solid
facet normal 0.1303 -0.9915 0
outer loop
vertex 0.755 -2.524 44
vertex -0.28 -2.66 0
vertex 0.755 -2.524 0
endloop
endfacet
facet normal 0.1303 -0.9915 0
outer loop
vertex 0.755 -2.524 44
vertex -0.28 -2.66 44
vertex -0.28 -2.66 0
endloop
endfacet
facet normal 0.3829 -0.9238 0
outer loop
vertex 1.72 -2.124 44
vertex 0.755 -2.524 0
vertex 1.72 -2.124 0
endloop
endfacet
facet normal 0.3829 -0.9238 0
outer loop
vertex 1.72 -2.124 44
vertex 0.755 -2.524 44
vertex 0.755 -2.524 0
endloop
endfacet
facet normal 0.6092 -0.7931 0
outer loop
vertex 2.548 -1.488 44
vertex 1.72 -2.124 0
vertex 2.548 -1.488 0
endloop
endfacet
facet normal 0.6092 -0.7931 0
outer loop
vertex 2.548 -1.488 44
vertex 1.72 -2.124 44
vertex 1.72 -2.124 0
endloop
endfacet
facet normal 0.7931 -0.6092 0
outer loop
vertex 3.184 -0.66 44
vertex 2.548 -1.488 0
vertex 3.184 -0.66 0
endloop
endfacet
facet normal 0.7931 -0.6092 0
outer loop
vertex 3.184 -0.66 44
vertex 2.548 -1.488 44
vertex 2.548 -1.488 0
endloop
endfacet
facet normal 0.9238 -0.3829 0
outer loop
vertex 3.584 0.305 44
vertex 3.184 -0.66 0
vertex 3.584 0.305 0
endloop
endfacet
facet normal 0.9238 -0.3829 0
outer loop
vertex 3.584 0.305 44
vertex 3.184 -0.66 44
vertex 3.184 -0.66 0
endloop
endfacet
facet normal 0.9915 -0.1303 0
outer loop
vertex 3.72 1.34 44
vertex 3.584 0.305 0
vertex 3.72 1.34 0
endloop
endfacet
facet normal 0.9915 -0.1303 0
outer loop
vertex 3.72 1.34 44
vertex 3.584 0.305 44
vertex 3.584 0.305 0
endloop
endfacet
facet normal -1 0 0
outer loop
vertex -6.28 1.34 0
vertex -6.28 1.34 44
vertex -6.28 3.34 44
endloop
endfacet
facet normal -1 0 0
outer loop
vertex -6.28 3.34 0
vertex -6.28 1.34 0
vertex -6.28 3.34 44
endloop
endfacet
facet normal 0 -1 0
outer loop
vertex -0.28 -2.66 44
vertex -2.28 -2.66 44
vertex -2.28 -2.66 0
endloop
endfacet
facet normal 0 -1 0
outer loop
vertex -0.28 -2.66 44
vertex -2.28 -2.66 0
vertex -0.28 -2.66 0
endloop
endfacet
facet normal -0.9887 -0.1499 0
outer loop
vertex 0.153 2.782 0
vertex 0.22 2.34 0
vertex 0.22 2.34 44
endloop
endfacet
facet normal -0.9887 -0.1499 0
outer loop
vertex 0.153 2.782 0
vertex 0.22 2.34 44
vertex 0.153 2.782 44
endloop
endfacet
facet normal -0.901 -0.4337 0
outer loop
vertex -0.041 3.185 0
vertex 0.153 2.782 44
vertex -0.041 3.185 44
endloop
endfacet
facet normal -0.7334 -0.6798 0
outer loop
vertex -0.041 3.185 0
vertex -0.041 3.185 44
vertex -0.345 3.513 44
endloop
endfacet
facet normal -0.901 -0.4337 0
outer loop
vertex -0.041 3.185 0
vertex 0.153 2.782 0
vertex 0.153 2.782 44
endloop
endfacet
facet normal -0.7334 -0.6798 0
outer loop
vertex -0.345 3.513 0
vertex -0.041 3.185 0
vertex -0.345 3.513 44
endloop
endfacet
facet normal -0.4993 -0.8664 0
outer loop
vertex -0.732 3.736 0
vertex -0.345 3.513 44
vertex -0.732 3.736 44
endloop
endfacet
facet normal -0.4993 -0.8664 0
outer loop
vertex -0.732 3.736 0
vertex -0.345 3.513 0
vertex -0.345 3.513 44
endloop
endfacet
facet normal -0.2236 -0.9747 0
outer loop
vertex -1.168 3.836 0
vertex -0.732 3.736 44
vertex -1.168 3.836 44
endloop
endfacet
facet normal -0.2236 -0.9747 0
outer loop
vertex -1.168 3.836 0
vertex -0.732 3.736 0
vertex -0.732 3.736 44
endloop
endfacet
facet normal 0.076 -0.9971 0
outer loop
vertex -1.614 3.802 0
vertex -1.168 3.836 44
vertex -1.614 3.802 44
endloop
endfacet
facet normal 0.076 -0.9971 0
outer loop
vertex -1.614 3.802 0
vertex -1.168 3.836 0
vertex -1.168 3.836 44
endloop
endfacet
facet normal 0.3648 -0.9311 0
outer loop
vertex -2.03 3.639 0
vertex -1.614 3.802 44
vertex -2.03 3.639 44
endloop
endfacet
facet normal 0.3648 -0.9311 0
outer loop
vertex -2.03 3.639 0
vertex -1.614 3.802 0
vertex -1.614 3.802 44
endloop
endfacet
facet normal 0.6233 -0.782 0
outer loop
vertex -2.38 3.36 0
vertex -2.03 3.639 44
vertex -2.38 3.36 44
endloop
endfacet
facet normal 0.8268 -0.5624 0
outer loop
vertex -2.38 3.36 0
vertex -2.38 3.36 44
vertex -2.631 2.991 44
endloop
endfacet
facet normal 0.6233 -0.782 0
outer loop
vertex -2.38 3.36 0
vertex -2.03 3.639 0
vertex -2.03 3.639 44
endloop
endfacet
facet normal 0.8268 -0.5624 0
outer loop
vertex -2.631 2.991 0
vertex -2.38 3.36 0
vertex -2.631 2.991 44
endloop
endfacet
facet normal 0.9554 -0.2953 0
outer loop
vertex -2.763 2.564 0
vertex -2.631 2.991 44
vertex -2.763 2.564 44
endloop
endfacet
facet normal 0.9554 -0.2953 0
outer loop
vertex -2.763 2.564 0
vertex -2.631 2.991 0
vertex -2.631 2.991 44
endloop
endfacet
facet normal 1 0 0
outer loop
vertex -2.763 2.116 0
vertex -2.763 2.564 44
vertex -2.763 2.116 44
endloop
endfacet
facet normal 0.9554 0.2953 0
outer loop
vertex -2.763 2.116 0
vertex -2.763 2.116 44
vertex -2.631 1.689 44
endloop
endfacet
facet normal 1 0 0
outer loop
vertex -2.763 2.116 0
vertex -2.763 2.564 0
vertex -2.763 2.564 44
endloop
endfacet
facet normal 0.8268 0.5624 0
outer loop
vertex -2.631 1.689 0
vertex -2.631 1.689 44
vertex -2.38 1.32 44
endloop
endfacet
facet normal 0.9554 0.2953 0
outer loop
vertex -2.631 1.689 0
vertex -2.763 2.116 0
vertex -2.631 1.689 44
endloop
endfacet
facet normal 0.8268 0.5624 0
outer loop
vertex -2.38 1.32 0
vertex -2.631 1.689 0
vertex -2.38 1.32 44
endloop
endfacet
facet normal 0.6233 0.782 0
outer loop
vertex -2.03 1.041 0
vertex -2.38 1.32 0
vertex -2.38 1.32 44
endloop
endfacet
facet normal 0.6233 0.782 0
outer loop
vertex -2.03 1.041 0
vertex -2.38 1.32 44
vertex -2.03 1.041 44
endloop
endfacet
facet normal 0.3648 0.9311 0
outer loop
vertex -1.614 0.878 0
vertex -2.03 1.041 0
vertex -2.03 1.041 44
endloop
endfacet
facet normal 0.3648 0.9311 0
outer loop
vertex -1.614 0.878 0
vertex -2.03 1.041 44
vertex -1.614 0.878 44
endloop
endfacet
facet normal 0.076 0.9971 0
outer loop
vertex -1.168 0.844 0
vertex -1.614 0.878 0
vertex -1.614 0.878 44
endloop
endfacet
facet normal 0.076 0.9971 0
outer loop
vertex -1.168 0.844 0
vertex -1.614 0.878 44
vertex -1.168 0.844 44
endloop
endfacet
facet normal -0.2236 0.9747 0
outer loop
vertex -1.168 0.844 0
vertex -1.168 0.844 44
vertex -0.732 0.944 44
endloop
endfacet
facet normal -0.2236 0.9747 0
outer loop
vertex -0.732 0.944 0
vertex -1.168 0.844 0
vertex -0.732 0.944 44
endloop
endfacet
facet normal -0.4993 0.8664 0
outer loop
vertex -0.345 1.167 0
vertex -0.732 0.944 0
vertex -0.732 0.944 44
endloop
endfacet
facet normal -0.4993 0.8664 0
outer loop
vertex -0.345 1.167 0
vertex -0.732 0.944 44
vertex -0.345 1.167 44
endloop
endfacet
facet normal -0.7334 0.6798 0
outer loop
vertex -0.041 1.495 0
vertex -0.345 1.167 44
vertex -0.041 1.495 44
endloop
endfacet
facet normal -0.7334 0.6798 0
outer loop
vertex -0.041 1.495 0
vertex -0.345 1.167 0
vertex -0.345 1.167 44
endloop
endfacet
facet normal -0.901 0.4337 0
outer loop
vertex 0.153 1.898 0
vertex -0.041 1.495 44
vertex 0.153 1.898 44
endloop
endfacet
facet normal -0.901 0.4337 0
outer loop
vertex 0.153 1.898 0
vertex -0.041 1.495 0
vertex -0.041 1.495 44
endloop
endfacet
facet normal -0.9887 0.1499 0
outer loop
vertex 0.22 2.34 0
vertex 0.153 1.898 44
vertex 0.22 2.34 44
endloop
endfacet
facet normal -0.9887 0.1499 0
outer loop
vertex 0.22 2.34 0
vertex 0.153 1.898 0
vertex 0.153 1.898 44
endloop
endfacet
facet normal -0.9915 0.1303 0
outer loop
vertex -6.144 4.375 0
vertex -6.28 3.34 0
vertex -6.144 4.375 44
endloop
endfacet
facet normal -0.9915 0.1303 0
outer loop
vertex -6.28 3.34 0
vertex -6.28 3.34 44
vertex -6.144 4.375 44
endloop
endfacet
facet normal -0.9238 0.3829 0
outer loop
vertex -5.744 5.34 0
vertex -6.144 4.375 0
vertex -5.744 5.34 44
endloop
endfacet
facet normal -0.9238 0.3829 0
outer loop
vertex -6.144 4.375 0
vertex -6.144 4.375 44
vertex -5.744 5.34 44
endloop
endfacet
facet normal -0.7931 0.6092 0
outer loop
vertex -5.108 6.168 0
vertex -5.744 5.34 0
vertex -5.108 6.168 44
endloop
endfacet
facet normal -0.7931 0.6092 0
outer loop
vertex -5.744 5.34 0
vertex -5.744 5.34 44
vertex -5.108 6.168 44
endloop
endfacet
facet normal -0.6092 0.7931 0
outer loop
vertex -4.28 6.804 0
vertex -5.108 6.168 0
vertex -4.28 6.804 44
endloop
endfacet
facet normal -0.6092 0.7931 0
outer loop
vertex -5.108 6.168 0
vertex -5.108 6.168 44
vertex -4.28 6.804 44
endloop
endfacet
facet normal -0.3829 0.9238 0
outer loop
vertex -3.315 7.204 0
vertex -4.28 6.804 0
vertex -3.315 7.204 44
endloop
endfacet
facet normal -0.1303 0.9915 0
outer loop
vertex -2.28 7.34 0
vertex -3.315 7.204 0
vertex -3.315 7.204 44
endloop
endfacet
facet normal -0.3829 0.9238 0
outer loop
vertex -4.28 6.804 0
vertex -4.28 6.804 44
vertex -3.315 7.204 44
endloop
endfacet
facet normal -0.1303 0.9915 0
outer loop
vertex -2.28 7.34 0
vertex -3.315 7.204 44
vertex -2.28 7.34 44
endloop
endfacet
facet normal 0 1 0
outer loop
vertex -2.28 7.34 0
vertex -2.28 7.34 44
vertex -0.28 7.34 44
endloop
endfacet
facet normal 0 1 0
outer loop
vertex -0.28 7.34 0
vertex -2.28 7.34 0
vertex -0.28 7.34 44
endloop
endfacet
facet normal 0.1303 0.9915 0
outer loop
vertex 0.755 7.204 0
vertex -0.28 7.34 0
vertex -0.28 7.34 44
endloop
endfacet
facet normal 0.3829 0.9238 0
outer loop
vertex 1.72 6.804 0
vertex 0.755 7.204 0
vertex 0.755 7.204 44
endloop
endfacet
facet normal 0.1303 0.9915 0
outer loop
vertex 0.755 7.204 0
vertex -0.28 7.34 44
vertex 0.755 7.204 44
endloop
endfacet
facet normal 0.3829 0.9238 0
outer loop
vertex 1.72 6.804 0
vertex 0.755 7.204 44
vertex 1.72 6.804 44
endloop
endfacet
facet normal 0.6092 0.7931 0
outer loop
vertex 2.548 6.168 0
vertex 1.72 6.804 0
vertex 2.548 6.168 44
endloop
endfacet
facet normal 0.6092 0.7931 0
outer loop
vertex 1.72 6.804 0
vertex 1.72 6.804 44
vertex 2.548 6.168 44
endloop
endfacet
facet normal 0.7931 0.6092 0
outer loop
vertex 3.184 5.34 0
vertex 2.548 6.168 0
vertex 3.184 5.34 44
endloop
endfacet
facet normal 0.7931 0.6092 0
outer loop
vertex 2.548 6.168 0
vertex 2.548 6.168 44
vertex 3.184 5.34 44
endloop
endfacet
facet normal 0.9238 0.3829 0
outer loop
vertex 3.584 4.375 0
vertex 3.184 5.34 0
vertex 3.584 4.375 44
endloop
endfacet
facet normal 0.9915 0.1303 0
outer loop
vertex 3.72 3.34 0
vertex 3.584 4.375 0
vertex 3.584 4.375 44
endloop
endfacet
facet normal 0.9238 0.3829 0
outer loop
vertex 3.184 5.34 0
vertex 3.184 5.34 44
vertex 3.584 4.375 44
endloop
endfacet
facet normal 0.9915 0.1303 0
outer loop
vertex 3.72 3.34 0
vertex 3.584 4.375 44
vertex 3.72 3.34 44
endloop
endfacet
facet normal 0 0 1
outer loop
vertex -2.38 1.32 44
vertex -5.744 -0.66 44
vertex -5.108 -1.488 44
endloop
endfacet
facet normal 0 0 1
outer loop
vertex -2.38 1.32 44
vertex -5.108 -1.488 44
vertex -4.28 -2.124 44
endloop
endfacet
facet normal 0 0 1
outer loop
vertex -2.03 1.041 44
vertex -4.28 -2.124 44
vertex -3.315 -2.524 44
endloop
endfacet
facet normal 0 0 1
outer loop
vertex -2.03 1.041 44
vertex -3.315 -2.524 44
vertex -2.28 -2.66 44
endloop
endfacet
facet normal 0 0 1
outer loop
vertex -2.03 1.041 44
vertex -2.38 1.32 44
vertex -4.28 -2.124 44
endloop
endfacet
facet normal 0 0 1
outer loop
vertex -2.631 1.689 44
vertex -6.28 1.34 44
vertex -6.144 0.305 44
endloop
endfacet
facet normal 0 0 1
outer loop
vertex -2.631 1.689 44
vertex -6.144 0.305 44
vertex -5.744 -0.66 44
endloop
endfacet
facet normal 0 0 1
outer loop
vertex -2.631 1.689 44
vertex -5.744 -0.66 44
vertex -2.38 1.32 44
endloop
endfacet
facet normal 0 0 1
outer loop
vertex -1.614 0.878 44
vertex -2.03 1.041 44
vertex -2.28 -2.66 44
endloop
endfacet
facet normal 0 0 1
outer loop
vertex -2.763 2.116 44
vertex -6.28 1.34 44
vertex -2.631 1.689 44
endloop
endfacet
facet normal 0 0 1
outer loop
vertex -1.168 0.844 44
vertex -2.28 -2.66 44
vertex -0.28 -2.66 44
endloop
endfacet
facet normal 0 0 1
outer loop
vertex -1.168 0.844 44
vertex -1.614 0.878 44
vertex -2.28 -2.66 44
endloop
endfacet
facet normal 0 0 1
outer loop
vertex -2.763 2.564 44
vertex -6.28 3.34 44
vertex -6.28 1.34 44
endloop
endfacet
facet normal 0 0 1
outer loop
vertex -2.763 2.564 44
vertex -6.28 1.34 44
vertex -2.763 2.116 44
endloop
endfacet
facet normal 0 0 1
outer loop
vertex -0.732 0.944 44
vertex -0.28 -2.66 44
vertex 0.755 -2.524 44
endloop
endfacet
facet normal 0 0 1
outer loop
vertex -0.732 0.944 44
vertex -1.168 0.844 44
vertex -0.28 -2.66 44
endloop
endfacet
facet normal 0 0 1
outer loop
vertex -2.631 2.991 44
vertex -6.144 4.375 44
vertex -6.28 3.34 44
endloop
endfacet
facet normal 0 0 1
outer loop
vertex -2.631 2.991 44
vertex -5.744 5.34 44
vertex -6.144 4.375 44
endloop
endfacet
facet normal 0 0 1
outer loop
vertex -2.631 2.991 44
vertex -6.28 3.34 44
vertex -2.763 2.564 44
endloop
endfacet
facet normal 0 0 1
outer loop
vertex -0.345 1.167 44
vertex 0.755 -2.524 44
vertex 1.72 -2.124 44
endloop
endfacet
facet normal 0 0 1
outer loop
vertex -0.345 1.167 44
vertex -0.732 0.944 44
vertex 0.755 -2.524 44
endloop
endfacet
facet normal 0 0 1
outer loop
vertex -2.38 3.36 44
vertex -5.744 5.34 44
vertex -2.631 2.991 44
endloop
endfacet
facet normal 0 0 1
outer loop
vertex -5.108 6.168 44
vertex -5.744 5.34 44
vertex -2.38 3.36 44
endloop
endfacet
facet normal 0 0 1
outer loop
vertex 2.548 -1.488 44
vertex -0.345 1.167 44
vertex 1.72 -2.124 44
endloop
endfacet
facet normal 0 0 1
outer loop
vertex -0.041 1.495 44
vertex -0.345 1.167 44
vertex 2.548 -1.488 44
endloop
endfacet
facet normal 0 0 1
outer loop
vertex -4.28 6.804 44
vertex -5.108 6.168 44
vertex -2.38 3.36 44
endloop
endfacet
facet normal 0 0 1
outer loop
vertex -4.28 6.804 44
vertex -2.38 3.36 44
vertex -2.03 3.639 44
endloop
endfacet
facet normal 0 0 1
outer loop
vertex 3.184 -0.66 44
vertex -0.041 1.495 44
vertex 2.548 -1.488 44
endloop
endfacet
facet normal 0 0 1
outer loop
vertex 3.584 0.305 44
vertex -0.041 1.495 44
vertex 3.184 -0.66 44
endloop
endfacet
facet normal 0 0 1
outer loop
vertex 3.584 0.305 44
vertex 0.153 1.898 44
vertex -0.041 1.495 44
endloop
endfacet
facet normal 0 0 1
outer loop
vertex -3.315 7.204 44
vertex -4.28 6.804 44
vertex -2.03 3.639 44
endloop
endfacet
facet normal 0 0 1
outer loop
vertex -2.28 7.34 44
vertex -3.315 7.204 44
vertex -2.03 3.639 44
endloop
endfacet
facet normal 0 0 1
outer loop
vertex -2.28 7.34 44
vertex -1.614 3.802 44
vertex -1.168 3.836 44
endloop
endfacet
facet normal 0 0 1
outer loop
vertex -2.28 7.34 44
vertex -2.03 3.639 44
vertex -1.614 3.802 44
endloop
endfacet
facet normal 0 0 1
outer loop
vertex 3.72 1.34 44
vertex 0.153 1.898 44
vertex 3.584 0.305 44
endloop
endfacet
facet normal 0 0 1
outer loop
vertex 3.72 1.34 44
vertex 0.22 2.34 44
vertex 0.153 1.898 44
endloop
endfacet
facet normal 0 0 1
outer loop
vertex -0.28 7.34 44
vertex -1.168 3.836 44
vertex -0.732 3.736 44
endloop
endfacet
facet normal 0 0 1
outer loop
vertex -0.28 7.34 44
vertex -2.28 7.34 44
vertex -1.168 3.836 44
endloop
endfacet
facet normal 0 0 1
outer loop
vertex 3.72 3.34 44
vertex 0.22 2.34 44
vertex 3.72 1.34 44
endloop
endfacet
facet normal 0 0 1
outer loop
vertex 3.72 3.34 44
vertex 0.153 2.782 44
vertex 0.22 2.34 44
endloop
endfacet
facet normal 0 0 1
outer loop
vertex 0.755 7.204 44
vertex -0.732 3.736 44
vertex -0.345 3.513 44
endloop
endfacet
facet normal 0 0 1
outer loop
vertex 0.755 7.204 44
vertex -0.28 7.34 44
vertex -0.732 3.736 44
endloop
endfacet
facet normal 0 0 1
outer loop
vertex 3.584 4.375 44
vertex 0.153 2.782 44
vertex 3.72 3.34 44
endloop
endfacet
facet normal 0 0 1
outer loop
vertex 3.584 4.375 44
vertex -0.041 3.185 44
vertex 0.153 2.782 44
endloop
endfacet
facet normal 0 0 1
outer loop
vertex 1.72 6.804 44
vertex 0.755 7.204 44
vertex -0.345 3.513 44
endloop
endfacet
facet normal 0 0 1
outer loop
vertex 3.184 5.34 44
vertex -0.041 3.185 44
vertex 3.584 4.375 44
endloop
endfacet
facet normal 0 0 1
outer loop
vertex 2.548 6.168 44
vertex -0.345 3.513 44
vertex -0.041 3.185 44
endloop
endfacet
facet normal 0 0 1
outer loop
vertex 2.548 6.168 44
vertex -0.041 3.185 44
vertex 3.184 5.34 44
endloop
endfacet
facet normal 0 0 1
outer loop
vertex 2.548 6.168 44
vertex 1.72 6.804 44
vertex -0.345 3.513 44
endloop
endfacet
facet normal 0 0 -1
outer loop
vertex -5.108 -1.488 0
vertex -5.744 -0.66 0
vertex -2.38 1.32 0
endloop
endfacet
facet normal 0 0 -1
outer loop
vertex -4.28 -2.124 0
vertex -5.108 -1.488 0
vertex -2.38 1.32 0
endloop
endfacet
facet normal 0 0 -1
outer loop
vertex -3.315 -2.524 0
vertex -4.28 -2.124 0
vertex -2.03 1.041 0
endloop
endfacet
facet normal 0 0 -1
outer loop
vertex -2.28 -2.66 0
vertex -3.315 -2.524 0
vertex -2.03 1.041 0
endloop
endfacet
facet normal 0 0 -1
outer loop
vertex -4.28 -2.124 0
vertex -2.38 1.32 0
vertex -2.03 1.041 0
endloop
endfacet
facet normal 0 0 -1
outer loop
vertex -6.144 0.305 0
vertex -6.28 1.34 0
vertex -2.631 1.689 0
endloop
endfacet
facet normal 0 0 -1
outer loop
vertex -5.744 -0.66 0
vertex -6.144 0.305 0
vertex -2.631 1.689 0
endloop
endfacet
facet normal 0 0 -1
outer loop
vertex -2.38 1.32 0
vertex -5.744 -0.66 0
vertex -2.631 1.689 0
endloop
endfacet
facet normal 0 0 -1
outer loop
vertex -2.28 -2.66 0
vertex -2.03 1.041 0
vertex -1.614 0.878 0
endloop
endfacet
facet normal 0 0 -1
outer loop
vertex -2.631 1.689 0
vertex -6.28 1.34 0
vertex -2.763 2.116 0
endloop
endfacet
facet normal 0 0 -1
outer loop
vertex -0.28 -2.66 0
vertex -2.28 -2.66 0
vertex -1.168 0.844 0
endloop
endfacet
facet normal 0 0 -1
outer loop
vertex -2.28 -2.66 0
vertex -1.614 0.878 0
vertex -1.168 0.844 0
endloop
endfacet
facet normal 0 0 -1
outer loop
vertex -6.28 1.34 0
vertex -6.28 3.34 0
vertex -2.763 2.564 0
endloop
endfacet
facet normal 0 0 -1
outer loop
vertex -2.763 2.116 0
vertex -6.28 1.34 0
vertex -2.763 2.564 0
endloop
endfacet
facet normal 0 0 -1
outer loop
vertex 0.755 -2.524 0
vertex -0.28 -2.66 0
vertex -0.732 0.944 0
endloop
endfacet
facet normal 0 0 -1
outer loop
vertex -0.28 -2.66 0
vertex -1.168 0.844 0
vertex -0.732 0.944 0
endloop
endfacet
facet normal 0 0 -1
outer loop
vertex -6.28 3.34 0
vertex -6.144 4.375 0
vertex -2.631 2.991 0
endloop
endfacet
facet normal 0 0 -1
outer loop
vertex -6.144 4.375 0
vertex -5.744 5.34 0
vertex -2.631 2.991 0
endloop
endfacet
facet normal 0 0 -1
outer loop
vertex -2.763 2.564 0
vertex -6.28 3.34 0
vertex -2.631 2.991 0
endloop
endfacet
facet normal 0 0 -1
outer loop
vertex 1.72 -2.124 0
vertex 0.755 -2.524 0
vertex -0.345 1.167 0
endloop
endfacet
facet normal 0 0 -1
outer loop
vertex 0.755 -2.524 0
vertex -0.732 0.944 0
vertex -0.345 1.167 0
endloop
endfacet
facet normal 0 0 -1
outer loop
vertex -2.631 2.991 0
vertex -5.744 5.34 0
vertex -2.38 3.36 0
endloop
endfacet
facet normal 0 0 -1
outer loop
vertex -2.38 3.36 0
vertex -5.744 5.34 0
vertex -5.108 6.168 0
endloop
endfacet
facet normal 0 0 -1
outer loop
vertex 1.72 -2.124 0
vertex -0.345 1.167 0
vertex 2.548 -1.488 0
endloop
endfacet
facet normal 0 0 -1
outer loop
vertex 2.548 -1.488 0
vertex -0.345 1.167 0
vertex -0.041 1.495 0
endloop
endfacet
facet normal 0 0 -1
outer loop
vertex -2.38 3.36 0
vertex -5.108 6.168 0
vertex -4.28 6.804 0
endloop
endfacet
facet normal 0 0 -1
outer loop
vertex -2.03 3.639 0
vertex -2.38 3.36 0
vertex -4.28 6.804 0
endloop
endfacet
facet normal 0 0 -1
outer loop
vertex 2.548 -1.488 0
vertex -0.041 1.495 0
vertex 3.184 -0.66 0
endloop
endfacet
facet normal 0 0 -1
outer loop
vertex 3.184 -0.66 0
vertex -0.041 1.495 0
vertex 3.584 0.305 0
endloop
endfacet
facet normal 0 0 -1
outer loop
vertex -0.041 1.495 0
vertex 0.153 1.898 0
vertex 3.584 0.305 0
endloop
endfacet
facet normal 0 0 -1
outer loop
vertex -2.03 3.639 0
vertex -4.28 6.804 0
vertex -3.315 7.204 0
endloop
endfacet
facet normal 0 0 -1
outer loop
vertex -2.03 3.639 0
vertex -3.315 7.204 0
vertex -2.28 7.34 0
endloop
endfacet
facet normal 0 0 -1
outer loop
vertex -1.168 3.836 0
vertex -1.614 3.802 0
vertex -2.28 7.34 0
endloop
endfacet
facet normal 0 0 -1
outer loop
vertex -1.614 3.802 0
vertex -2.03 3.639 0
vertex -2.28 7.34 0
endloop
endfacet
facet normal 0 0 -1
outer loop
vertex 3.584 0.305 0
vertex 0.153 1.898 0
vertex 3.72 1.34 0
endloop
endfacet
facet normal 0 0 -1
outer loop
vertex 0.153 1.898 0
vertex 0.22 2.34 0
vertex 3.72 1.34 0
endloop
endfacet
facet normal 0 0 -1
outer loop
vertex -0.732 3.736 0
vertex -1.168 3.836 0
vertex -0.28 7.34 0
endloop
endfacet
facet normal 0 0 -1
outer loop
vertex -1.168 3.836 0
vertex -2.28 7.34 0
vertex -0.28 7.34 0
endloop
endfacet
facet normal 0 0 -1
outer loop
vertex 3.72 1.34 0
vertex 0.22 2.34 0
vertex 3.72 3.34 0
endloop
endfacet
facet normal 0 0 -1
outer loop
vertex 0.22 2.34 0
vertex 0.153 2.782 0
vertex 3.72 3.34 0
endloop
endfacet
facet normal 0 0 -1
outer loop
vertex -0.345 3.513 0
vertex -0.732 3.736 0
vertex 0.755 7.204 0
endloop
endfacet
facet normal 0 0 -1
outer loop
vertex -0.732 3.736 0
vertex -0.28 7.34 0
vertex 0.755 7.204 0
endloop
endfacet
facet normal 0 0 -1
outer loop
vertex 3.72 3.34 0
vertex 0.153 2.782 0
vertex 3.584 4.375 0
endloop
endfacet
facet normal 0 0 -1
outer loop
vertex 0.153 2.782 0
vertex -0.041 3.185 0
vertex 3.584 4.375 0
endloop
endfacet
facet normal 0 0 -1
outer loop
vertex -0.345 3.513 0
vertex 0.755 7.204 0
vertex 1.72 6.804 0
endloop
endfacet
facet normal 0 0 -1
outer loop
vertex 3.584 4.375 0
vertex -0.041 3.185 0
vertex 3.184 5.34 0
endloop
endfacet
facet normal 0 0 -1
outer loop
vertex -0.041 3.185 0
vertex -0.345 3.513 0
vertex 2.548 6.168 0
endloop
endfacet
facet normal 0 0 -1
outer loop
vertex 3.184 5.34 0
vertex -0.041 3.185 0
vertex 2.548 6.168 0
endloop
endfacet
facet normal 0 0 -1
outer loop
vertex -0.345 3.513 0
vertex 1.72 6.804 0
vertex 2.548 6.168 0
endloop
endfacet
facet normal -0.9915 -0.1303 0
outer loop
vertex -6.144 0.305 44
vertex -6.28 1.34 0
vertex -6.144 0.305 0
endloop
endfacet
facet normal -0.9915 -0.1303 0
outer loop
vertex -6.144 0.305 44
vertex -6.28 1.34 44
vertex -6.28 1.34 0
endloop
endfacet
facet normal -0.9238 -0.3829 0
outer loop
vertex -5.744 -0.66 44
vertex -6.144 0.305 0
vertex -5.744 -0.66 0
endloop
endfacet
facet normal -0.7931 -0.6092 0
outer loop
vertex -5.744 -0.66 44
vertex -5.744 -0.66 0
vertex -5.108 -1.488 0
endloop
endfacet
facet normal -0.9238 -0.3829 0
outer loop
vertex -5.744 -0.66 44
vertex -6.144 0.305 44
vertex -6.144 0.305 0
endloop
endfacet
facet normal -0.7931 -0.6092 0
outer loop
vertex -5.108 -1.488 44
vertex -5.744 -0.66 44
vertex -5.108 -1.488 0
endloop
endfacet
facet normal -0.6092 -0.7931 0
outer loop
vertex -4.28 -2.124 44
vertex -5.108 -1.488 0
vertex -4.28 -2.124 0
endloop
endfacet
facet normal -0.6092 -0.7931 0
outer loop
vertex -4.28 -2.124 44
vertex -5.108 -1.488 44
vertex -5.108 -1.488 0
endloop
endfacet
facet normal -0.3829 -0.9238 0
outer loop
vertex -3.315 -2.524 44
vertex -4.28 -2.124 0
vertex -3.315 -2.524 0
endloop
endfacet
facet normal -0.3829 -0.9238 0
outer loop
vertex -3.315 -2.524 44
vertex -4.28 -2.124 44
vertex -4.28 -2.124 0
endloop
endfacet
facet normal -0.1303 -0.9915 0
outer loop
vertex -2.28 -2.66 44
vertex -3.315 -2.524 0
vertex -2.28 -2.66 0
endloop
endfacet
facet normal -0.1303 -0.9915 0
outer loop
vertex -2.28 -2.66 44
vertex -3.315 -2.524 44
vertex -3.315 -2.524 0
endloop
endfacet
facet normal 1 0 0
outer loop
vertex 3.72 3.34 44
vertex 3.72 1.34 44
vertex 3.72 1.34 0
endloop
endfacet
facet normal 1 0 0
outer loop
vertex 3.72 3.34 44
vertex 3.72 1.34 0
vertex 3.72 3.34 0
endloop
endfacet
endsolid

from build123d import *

# Parameters (mm, degrees)
SKETCH_1_W      = 10
SKETCH_1_H      = 10
SKETCH_1_R      = 1.5
EXTRUDE_1_DEPTH = 44
FILLET_1_R      = 4


with BuildPart() as part:
    # 草图1 → 凸台-拉伸1 (new body)
    with BuildSketch(Plane.XY):
        with Locations((-1.28, 2.34)):
            Rectangle(SKETCH_1_W, SKETCH_1_H)
        with Locations((-1.28, 2.34)):
            Circle(SKETCH_1_R, mode=Mode.SUBTRACT)
    extrude(amount=EXTRUDE_1_DEPTH)

    # 圆角1
    fillet_1_edges = [part.edges().sort_by_distance(p)[0] for p in [
        (3.72, -2.66, 22),
        (-6.28, -2.66, 22),
        (-6.28, 7.34, 22),
        (3.72, 7.34, 22),
    ]]
    fillet(fillet_1_edges, radius=FILLET_1_R)


solid = part.part
